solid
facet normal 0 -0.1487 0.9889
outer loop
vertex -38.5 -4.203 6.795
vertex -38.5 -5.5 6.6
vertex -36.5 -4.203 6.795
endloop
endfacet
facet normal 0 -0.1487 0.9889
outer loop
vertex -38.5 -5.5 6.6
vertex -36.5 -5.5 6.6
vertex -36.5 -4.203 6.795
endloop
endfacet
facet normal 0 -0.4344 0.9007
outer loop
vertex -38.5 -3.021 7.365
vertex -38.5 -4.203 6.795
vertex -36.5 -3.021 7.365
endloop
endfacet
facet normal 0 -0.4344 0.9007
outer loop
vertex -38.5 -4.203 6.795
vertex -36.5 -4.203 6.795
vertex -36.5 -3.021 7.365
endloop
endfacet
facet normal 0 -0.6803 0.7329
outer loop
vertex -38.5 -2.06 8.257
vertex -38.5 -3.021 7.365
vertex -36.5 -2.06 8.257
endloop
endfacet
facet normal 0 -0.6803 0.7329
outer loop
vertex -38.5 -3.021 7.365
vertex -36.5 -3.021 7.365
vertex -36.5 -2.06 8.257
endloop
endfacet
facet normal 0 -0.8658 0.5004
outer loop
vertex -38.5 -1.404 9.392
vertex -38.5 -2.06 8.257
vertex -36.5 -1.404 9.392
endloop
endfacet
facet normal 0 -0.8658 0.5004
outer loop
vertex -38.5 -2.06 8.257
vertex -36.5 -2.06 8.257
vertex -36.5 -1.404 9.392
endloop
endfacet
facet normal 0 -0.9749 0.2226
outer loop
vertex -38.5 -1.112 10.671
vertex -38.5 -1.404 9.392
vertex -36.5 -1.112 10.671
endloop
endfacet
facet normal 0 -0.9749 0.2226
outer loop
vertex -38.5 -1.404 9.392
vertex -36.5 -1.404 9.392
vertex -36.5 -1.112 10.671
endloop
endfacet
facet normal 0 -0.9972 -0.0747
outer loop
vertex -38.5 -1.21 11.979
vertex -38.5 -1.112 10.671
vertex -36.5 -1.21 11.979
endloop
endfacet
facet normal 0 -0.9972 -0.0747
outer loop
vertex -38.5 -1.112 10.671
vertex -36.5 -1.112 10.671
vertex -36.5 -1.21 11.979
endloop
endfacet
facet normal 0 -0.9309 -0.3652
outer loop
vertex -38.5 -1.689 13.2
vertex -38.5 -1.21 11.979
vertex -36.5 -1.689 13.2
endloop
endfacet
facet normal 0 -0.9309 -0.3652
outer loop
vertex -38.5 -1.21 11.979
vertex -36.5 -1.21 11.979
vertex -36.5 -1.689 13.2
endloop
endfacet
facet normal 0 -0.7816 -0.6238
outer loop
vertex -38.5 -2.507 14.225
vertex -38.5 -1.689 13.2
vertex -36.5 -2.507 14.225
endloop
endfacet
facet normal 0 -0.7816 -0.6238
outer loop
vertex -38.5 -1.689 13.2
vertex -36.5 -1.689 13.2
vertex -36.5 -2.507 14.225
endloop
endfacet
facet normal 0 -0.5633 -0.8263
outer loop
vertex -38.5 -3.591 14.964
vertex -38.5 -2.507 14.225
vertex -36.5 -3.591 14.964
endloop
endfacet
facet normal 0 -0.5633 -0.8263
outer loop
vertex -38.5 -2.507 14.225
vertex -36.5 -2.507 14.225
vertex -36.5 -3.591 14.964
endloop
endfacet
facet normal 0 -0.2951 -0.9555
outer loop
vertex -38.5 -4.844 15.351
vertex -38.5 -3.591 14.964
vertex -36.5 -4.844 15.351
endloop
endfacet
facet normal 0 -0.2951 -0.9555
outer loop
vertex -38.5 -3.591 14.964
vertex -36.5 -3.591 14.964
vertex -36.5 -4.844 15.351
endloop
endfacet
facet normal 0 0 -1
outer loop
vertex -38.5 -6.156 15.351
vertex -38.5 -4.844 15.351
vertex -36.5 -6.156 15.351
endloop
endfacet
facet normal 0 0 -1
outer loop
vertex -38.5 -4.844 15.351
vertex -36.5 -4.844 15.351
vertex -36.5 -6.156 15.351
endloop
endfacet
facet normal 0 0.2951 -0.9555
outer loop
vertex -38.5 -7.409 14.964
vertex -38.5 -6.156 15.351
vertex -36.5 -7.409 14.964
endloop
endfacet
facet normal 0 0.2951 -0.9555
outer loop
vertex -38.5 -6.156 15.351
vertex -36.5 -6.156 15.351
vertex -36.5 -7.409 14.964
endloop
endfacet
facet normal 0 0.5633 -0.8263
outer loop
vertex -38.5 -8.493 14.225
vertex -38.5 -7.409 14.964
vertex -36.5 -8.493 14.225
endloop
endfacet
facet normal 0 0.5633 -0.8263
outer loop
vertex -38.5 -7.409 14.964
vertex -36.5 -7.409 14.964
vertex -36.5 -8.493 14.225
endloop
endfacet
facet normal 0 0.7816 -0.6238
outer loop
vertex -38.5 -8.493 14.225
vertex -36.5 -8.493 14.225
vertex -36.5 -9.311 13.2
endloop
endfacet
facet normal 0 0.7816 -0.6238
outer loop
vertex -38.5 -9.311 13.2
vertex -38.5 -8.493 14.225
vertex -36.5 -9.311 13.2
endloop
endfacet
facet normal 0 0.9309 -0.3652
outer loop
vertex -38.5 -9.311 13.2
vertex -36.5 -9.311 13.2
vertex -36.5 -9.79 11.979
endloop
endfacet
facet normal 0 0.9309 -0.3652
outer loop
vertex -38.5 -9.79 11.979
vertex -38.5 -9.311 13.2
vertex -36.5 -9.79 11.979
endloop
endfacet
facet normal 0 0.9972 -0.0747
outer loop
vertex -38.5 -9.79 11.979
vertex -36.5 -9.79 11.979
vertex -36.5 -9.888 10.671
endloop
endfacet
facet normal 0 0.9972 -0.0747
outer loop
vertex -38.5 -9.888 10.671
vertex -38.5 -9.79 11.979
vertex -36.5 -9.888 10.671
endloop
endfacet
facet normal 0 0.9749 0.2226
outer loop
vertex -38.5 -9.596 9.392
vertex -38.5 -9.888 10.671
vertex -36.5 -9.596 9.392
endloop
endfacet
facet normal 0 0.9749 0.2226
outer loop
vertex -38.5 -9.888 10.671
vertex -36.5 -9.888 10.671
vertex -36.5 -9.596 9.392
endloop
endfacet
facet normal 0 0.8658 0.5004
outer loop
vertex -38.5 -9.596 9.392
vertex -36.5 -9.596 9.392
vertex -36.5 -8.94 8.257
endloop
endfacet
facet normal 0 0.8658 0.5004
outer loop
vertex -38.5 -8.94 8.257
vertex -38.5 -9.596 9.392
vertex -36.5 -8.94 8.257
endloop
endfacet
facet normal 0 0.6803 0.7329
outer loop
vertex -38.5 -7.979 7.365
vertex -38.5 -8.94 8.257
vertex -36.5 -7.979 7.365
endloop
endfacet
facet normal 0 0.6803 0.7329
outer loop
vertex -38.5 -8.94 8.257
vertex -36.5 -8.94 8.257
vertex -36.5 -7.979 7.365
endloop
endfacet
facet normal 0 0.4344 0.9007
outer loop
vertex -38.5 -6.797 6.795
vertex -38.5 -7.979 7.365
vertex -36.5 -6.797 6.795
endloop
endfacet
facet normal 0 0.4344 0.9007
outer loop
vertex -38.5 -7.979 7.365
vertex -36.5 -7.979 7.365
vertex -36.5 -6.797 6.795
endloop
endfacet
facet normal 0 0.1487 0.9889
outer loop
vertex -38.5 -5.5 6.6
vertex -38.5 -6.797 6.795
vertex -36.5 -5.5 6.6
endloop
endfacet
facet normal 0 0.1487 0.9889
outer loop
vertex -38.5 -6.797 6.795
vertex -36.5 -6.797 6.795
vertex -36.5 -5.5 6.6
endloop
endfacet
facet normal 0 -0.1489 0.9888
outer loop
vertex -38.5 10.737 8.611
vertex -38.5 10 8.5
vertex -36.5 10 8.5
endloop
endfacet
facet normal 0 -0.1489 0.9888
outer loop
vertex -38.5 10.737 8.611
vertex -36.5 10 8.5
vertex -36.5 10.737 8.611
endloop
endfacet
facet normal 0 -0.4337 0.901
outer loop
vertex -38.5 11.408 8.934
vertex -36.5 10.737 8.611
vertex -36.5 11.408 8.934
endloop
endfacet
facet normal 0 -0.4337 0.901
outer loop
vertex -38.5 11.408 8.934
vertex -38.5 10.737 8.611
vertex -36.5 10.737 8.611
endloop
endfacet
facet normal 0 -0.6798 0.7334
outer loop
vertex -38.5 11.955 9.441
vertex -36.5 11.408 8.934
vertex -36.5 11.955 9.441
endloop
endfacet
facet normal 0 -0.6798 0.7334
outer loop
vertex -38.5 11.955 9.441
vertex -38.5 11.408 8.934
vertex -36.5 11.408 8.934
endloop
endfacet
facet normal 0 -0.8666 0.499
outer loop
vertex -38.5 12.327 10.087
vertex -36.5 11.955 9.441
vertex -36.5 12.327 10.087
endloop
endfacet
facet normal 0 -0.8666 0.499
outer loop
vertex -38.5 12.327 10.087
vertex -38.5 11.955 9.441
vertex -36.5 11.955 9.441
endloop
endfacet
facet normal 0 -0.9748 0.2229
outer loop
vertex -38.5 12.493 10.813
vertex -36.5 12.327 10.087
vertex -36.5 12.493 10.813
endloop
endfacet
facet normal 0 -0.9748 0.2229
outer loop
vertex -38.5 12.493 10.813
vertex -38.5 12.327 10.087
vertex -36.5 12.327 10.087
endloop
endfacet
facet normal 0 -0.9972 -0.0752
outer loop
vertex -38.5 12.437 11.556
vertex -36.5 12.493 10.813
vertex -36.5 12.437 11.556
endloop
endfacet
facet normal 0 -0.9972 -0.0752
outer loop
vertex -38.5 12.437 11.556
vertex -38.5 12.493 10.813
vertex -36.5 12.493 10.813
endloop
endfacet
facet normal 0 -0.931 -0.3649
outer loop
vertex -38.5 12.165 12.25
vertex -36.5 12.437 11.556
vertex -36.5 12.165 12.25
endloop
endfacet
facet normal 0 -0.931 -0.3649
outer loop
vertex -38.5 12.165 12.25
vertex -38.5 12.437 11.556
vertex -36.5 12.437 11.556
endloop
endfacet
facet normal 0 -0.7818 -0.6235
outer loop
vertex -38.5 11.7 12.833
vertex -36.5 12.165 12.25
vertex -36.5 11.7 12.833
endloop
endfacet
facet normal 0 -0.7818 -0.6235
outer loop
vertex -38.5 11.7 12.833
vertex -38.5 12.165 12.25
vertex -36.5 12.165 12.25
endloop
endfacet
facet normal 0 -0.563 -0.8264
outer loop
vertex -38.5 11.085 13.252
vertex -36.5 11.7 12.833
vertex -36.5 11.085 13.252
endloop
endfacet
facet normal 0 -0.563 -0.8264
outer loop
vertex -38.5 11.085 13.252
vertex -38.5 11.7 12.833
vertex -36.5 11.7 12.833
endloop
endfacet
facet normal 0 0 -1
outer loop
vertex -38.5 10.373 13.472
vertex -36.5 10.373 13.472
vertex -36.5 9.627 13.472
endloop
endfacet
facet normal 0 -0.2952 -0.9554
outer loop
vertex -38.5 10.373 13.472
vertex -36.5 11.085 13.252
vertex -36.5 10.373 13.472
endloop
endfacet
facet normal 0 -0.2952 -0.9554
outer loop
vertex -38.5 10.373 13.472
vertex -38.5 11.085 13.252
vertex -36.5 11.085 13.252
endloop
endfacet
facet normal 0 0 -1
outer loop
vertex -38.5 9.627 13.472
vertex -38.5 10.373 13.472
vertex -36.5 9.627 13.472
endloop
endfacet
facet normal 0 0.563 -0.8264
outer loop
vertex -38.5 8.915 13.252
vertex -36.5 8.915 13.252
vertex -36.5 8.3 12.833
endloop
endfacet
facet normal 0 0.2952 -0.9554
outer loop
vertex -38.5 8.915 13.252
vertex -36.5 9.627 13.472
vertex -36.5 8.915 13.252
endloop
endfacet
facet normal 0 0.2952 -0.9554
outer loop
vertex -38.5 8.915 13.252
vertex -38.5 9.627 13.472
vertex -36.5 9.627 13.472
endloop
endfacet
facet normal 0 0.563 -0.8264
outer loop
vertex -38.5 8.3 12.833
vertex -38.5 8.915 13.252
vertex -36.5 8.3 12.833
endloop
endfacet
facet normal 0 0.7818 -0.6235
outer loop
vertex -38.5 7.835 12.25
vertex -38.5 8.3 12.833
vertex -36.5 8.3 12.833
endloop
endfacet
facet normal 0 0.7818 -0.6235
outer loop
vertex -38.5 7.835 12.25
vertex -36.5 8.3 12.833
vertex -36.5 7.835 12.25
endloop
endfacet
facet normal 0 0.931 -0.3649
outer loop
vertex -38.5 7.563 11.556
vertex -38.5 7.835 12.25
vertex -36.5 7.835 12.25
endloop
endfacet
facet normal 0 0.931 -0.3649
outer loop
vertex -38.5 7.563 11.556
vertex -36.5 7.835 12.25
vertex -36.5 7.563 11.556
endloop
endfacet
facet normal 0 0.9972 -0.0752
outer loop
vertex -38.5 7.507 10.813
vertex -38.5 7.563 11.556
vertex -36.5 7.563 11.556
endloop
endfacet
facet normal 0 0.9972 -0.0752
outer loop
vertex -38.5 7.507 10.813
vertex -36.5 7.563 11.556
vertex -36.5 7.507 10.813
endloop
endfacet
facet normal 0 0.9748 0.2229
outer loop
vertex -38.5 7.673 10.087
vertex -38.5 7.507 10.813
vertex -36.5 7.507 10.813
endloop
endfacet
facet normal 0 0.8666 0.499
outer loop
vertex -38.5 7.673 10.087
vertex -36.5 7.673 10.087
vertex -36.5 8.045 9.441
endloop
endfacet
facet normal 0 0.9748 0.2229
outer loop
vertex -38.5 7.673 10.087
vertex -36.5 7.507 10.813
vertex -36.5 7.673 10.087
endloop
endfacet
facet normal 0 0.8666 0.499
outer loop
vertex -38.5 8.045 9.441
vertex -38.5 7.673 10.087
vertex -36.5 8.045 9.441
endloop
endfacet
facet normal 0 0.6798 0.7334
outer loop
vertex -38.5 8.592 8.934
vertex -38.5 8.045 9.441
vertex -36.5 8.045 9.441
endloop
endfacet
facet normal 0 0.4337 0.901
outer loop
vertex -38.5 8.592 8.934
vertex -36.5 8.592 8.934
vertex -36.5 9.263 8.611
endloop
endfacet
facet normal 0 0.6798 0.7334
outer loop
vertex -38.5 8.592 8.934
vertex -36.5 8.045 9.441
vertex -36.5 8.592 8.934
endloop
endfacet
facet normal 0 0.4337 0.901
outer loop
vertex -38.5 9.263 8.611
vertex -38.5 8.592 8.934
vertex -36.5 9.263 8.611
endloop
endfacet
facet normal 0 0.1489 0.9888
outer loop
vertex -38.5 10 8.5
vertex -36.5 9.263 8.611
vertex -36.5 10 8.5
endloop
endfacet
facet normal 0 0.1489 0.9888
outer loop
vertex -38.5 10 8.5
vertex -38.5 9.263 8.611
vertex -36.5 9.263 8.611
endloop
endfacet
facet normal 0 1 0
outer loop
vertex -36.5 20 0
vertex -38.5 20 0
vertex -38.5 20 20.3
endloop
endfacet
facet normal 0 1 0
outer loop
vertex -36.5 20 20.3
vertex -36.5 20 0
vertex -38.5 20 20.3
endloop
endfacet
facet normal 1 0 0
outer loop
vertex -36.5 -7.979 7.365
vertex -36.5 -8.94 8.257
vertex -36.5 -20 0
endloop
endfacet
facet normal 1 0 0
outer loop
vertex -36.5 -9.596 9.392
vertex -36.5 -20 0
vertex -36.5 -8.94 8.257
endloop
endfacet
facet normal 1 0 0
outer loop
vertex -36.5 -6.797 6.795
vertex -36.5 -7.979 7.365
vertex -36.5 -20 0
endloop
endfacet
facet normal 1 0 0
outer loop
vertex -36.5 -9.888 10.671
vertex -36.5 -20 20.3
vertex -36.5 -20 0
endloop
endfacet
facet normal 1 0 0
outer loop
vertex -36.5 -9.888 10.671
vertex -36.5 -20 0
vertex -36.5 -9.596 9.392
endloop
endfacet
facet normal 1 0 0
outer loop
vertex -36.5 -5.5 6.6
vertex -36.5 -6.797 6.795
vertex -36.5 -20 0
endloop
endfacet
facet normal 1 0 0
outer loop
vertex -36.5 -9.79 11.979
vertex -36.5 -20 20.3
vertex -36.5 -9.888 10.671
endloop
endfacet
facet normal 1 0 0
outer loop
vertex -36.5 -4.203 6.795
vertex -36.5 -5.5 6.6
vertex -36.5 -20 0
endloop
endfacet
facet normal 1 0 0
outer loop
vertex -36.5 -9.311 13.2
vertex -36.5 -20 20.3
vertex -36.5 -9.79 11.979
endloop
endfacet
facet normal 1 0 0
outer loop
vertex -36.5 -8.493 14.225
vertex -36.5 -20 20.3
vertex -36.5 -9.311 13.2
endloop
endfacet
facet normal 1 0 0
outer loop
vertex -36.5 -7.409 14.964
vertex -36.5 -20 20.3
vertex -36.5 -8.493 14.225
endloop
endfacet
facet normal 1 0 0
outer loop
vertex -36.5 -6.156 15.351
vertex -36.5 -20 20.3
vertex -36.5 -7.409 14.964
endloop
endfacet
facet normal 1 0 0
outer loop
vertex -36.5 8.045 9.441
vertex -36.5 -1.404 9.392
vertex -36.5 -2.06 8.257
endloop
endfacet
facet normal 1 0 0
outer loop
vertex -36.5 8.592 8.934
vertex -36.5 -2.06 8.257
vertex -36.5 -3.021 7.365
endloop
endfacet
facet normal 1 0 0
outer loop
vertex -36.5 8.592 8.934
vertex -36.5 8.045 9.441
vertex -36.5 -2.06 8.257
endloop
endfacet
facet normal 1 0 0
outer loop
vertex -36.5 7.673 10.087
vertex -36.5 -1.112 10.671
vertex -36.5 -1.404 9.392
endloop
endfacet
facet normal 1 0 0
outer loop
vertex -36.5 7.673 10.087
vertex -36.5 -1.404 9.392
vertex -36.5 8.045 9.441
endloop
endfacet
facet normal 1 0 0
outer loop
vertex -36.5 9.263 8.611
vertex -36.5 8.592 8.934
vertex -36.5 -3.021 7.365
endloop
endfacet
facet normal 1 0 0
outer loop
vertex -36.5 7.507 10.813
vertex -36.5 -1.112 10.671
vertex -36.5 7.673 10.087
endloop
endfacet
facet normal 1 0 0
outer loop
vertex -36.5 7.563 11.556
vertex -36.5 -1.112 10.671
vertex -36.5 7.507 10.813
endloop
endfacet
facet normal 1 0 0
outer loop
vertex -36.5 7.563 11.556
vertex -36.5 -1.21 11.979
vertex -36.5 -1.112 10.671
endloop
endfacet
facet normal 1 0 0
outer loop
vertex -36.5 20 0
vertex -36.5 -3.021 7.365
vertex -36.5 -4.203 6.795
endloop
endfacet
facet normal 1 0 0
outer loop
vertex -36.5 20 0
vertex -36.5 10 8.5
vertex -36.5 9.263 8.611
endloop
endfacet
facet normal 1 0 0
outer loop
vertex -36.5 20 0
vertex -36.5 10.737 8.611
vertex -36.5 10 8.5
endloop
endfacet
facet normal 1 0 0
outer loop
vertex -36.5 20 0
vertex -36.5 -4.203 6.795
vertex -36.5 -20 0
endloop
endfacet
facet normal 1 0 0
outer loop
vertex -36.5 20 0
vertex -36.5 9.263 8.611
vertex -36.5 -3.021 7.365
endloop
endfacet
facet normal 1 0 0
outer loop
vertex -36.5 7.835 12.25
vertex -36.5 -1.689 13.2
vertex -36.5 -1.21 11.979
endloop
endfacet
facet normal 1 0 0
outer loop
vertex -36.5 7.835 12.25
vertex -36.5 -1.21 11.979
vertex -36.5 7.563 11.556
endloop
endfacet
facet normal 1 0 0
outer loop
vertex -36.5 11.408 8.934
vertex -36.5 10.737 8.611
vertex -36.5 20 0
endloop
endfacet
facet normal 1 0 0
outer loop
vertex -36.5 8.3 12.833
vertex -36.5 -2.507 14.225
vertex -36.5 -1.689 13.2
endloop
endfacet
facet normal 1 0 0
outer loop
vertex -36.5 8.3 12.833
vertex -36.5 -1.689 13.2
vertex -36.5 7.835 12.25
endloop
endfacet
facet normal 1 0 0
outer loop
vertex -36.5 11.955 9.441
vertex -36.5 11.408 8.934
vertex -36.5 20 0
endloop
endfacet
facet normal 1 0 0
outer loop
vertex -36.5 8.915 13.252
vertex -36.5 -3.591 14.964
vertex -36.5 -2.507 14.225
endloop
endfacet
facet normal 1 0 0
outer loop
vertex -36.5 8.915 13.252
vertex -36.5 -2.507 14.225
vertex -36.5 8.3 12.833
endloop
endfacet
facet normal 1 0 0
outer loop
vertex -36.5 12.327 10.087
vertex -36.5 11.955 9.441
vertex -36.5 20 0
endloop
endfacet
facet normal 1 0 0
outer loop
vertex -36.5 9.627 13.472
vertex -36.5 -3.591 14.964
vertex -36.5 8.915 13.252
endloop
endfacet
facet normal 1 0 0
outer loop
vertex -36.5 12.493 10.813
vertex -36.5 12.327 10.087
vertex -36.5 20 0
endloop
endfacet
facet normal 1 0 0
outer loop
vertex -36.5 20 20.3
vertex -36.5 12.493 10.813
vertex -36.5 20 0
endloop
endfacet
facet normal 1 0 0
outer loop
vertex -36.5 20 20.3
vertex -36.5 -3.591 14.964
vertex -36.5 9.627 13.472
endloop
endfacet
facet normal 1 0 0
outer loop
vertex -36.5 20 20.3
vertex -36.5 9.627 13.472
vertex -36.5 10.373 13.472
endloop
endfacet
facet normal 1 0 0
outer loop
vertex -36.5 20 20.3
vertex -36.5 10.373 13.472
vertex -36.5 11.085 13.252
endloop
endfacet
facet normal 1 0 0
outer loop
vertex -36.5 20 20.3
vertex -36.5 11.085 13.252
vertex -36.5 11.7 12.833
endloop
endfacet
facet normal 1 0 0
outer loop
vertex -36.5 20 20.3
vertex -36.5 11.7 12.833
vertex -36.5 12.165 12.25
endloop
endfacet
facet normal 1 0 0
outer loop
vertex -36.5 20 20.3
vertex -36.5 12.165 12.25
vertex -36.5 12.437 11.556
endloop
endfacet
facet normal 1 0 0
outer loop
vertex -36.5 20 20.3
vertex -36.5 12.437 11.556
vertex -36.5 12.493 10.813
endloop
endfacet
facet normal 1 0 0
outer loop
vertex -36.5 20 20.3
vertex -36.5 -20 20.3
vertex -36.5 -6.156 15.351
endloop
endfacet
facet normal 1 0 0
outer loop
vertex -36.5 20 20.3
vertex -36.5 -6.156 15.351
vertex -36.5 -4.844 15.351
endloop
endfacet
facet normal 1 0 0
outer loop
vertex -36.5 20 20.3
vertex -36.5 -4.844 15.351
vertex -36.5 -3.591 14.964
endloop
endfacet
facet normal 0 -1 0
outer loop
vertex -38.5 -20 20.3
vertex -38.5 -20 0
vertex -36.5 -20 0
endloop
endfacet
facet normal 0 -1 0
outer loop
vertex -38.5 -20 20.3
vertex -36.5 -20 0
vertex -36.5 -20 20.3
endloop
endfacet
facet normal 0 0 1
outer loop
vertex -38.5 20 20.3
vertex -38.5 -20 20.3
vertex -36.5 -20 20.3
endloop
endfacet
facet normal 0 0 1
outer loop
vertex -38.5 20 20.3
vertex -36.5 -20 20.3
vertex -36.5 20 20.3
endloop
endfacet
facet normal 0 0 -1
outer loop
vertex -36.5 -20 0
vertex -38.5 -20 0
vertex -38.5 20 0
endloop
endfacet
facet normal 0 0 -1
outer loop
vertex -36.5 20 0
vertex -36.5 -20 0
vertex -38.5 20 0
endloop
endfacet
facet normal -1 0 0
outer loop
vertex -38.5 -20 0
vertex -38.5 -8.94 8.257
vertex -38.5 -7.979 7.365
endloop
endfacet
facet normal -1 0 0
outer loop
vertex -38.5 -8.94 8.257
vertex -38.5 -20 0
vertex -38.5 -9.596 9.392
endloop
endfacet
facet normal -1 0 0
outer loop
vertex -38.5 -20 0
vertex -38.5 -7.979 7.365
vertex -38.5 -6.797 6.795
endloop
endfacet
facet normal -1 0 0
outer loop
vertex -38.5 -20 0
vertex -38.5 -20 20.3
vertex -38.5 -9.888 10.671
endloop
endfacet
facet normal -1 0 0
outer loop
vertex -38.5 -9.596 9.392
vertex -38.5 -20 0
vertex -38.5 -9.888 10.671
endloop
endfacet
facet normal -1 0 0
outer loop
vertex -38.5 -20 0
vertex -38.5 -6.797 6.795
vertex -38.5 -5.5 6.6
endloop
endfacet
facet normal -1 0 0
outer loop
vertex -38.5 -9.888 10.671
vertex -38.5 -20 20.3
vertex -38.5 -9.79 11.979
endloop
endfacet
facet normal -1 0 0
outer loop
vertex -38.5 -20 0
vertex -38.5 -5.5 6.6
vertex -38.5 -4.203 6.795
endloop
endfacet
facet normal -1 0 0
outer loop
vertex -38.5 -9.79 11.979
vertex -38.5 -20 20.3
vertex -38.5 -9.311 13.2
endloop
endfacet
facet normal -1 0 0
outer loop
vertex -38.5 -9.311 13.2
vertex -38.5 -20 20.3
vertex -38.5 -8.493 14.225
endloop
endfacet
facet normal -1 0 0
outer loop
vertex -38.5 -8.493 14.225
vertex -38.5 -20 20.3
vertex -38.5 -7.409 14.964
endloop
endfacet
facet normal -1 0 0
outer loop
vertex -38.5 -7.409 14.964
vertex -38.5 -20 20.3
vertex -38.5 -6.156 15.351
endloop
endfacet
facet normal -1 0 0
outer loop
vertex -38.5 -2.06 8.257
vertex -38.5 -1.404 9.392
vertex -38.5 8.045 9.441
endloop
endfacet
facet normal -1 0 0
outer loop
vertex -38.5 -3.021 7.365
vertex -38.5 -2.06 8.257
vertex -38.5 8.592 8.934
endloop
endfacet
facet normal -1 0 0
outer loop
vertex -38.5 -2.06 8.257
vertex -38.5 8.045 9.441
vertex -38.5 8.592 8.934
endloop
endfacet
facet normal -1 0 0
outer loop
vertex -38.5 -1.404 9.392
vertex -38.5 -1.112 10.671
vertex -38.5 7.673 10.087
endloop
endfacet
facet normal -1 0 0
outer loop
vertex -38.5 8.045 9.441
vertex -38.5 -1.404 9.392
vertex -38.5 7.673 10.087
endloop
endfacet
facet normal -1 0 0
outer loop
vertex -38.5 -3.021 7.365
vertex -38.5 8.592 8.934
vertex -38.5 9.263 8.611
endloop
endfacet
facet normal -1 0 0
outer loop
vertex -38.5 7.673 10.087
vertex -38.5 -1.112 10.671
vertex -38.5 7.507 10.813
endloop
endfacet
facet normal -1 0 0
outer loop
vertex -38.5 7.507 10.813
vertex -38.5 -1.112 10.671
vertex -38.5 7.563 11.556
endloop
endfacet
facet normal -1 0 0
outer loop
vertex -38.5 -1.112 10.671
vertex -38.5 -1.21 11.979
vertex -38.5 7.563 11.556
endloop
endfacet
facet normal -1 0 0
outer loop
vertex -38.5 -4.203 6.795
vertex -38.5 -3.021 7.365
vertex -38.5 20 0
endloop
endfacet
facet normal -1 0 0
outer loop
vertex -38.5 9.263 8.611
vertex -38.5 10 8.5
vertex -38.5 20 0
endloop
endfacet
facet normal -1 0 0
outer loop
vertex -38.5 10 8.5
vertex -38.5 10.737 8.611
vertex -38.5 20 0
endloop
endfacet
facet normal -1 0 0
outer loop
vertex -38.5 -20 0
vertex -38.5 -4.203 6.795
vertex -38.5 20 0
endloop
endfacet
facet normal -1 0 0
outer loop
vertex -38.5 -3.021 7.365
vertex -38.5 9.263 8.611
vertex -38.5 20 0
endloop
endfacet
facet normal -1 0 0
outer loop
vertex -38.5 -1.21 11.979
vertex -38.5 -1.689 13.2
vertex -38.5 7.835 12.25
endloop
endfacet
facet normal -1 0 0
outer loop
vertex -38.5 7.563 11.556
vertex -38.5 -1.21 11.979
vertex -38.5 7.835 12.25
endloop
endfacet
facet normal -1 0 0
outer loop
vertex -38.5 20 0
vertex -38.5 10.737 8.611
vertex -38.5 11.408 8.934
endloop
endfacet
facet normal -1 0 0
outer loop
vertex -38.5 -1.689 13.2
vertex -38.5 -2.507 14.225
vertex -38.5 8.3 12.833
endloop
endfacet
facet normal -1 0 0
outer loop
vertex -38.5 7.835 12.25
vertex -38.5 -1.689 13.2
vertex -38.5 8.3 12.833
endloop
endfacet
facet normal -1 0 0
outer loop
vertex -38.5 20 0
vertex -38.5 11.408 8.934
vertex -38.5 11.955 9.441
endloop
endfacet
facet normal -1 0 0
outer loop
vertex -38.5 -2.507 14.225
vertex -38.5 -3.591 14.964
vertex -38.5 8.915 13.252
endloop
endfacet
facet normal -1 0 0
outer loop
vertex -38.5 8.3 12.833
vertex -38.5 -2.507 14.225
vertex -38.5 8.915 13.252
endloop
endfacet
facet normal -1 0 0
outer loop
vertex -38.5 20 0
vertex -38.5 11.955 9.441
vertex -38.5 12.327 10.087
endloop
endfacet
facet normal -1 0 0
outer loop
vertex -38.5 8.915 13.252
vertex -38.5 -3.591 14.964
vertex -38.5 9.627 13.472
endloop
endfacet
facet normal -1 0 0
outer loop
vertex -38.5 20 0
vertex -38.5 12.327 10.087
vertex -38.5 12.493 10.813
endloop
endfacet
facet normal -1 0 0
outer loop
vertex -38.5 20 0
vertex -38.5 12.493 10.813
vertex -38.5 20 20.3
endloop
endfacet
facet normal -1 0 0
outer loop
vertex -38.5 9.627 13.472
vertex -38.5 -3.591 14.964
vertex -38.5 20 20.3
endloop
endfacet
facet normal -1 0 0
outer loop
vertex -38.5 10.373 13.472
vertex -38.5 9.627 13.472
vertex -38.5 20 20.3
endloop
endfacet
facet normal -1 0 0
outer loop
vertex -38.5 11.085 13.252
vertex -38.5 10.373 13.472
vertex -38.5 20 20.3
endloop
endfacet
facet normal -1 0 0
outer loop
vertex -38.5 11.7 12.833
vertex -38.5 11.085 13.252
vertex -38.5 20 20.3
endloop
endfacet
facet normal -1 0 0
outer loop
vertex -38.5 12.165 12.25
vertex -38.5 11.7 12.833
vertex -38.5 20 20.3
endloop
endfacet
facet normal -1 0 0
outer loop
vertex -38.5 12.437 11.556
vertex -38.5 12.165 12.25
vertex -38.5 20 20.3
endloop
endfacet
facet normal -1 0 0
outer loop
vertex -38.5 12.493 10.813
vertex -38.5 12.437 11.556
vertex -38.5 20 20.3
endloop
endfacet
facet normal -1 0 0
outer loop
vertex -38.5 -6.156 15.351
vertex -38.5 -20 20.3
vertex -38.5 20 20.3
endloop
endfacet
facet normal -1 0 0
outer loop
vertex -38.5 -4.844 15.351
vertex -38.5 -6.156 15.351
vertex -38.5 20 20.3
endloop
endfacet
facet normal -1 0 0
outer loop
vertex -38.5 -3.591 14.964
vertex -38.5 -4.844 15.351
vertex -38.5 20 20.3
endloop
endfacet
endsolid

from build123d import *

# Parameters (mm, degrees)
SKETCH006_W    = 16
SKETCH006_H    = 5.3
SKETCH006_W_2  = 5.6
SKETCH006_H_2  = 4.4
CYLINDER_R     = 2.5
CYLINDER_DEPTH = 10
SKETCH_W       = 40
SKETCH_H       = 20.3
PAD005_DEPTH   = 2


with BuildPart() as power_socket_mockup:
    # Sketch006 → Revolution (revolve)
    with BuildSketch(Plane.XZ):
        with Locations((8, -2.65)):
            Rectangle(SKETCH006_W, SKETCH006_H)
        with Locations((-2.8, -2.2)):
            Rectangle(SKETCH006_W_2, SKETCH006_H_2)
    revolve(axis=Axis((0, 0, 0), (1, 0, 0)))


with BuildPart() as power_socket_mockup_1:
    # Body005 placement: moved
    add(power_socket_mockup.part.moved(Location((-36, -5.5, 11))))


with BuildPart() as wire_hole:
    # Cylinder → Cylinder (new body)
    with BuildSketch(Plane(origin=(-41, 10, 11), x_dir=(0, 0, -1), z_dir=(1, 0, 0))):
        Circle(CYLINDER_R)
    extrude(amount=CYLINDER_DEPTH)


with BuildPart() as power_holes_cut:
    # Sketch → Pad005 (new body)
    with BuildSketch(Plane.YZ.offset(28.5)):
        with Locations((0, 10.15)):
            Rectangle(SKETCH_W, SKETCH_H)
    extrude(amount=PAD005_DEPTH)


with BuildPart() as power_holes_cut_1:
    # Body003 placement: moved
    add(power_holes_cut.part.moved(Location((-67, 0, 0))))

    # Cut: cut wire_hole
    add(wire_hole.part, mode=Mode.SUBTRACT)

    # Cut002: cut power socket mockup
    add(power_socket_mockup_1.part, mode=Mode.SUBTRACT)


solid = power_holes_cut_1.part
